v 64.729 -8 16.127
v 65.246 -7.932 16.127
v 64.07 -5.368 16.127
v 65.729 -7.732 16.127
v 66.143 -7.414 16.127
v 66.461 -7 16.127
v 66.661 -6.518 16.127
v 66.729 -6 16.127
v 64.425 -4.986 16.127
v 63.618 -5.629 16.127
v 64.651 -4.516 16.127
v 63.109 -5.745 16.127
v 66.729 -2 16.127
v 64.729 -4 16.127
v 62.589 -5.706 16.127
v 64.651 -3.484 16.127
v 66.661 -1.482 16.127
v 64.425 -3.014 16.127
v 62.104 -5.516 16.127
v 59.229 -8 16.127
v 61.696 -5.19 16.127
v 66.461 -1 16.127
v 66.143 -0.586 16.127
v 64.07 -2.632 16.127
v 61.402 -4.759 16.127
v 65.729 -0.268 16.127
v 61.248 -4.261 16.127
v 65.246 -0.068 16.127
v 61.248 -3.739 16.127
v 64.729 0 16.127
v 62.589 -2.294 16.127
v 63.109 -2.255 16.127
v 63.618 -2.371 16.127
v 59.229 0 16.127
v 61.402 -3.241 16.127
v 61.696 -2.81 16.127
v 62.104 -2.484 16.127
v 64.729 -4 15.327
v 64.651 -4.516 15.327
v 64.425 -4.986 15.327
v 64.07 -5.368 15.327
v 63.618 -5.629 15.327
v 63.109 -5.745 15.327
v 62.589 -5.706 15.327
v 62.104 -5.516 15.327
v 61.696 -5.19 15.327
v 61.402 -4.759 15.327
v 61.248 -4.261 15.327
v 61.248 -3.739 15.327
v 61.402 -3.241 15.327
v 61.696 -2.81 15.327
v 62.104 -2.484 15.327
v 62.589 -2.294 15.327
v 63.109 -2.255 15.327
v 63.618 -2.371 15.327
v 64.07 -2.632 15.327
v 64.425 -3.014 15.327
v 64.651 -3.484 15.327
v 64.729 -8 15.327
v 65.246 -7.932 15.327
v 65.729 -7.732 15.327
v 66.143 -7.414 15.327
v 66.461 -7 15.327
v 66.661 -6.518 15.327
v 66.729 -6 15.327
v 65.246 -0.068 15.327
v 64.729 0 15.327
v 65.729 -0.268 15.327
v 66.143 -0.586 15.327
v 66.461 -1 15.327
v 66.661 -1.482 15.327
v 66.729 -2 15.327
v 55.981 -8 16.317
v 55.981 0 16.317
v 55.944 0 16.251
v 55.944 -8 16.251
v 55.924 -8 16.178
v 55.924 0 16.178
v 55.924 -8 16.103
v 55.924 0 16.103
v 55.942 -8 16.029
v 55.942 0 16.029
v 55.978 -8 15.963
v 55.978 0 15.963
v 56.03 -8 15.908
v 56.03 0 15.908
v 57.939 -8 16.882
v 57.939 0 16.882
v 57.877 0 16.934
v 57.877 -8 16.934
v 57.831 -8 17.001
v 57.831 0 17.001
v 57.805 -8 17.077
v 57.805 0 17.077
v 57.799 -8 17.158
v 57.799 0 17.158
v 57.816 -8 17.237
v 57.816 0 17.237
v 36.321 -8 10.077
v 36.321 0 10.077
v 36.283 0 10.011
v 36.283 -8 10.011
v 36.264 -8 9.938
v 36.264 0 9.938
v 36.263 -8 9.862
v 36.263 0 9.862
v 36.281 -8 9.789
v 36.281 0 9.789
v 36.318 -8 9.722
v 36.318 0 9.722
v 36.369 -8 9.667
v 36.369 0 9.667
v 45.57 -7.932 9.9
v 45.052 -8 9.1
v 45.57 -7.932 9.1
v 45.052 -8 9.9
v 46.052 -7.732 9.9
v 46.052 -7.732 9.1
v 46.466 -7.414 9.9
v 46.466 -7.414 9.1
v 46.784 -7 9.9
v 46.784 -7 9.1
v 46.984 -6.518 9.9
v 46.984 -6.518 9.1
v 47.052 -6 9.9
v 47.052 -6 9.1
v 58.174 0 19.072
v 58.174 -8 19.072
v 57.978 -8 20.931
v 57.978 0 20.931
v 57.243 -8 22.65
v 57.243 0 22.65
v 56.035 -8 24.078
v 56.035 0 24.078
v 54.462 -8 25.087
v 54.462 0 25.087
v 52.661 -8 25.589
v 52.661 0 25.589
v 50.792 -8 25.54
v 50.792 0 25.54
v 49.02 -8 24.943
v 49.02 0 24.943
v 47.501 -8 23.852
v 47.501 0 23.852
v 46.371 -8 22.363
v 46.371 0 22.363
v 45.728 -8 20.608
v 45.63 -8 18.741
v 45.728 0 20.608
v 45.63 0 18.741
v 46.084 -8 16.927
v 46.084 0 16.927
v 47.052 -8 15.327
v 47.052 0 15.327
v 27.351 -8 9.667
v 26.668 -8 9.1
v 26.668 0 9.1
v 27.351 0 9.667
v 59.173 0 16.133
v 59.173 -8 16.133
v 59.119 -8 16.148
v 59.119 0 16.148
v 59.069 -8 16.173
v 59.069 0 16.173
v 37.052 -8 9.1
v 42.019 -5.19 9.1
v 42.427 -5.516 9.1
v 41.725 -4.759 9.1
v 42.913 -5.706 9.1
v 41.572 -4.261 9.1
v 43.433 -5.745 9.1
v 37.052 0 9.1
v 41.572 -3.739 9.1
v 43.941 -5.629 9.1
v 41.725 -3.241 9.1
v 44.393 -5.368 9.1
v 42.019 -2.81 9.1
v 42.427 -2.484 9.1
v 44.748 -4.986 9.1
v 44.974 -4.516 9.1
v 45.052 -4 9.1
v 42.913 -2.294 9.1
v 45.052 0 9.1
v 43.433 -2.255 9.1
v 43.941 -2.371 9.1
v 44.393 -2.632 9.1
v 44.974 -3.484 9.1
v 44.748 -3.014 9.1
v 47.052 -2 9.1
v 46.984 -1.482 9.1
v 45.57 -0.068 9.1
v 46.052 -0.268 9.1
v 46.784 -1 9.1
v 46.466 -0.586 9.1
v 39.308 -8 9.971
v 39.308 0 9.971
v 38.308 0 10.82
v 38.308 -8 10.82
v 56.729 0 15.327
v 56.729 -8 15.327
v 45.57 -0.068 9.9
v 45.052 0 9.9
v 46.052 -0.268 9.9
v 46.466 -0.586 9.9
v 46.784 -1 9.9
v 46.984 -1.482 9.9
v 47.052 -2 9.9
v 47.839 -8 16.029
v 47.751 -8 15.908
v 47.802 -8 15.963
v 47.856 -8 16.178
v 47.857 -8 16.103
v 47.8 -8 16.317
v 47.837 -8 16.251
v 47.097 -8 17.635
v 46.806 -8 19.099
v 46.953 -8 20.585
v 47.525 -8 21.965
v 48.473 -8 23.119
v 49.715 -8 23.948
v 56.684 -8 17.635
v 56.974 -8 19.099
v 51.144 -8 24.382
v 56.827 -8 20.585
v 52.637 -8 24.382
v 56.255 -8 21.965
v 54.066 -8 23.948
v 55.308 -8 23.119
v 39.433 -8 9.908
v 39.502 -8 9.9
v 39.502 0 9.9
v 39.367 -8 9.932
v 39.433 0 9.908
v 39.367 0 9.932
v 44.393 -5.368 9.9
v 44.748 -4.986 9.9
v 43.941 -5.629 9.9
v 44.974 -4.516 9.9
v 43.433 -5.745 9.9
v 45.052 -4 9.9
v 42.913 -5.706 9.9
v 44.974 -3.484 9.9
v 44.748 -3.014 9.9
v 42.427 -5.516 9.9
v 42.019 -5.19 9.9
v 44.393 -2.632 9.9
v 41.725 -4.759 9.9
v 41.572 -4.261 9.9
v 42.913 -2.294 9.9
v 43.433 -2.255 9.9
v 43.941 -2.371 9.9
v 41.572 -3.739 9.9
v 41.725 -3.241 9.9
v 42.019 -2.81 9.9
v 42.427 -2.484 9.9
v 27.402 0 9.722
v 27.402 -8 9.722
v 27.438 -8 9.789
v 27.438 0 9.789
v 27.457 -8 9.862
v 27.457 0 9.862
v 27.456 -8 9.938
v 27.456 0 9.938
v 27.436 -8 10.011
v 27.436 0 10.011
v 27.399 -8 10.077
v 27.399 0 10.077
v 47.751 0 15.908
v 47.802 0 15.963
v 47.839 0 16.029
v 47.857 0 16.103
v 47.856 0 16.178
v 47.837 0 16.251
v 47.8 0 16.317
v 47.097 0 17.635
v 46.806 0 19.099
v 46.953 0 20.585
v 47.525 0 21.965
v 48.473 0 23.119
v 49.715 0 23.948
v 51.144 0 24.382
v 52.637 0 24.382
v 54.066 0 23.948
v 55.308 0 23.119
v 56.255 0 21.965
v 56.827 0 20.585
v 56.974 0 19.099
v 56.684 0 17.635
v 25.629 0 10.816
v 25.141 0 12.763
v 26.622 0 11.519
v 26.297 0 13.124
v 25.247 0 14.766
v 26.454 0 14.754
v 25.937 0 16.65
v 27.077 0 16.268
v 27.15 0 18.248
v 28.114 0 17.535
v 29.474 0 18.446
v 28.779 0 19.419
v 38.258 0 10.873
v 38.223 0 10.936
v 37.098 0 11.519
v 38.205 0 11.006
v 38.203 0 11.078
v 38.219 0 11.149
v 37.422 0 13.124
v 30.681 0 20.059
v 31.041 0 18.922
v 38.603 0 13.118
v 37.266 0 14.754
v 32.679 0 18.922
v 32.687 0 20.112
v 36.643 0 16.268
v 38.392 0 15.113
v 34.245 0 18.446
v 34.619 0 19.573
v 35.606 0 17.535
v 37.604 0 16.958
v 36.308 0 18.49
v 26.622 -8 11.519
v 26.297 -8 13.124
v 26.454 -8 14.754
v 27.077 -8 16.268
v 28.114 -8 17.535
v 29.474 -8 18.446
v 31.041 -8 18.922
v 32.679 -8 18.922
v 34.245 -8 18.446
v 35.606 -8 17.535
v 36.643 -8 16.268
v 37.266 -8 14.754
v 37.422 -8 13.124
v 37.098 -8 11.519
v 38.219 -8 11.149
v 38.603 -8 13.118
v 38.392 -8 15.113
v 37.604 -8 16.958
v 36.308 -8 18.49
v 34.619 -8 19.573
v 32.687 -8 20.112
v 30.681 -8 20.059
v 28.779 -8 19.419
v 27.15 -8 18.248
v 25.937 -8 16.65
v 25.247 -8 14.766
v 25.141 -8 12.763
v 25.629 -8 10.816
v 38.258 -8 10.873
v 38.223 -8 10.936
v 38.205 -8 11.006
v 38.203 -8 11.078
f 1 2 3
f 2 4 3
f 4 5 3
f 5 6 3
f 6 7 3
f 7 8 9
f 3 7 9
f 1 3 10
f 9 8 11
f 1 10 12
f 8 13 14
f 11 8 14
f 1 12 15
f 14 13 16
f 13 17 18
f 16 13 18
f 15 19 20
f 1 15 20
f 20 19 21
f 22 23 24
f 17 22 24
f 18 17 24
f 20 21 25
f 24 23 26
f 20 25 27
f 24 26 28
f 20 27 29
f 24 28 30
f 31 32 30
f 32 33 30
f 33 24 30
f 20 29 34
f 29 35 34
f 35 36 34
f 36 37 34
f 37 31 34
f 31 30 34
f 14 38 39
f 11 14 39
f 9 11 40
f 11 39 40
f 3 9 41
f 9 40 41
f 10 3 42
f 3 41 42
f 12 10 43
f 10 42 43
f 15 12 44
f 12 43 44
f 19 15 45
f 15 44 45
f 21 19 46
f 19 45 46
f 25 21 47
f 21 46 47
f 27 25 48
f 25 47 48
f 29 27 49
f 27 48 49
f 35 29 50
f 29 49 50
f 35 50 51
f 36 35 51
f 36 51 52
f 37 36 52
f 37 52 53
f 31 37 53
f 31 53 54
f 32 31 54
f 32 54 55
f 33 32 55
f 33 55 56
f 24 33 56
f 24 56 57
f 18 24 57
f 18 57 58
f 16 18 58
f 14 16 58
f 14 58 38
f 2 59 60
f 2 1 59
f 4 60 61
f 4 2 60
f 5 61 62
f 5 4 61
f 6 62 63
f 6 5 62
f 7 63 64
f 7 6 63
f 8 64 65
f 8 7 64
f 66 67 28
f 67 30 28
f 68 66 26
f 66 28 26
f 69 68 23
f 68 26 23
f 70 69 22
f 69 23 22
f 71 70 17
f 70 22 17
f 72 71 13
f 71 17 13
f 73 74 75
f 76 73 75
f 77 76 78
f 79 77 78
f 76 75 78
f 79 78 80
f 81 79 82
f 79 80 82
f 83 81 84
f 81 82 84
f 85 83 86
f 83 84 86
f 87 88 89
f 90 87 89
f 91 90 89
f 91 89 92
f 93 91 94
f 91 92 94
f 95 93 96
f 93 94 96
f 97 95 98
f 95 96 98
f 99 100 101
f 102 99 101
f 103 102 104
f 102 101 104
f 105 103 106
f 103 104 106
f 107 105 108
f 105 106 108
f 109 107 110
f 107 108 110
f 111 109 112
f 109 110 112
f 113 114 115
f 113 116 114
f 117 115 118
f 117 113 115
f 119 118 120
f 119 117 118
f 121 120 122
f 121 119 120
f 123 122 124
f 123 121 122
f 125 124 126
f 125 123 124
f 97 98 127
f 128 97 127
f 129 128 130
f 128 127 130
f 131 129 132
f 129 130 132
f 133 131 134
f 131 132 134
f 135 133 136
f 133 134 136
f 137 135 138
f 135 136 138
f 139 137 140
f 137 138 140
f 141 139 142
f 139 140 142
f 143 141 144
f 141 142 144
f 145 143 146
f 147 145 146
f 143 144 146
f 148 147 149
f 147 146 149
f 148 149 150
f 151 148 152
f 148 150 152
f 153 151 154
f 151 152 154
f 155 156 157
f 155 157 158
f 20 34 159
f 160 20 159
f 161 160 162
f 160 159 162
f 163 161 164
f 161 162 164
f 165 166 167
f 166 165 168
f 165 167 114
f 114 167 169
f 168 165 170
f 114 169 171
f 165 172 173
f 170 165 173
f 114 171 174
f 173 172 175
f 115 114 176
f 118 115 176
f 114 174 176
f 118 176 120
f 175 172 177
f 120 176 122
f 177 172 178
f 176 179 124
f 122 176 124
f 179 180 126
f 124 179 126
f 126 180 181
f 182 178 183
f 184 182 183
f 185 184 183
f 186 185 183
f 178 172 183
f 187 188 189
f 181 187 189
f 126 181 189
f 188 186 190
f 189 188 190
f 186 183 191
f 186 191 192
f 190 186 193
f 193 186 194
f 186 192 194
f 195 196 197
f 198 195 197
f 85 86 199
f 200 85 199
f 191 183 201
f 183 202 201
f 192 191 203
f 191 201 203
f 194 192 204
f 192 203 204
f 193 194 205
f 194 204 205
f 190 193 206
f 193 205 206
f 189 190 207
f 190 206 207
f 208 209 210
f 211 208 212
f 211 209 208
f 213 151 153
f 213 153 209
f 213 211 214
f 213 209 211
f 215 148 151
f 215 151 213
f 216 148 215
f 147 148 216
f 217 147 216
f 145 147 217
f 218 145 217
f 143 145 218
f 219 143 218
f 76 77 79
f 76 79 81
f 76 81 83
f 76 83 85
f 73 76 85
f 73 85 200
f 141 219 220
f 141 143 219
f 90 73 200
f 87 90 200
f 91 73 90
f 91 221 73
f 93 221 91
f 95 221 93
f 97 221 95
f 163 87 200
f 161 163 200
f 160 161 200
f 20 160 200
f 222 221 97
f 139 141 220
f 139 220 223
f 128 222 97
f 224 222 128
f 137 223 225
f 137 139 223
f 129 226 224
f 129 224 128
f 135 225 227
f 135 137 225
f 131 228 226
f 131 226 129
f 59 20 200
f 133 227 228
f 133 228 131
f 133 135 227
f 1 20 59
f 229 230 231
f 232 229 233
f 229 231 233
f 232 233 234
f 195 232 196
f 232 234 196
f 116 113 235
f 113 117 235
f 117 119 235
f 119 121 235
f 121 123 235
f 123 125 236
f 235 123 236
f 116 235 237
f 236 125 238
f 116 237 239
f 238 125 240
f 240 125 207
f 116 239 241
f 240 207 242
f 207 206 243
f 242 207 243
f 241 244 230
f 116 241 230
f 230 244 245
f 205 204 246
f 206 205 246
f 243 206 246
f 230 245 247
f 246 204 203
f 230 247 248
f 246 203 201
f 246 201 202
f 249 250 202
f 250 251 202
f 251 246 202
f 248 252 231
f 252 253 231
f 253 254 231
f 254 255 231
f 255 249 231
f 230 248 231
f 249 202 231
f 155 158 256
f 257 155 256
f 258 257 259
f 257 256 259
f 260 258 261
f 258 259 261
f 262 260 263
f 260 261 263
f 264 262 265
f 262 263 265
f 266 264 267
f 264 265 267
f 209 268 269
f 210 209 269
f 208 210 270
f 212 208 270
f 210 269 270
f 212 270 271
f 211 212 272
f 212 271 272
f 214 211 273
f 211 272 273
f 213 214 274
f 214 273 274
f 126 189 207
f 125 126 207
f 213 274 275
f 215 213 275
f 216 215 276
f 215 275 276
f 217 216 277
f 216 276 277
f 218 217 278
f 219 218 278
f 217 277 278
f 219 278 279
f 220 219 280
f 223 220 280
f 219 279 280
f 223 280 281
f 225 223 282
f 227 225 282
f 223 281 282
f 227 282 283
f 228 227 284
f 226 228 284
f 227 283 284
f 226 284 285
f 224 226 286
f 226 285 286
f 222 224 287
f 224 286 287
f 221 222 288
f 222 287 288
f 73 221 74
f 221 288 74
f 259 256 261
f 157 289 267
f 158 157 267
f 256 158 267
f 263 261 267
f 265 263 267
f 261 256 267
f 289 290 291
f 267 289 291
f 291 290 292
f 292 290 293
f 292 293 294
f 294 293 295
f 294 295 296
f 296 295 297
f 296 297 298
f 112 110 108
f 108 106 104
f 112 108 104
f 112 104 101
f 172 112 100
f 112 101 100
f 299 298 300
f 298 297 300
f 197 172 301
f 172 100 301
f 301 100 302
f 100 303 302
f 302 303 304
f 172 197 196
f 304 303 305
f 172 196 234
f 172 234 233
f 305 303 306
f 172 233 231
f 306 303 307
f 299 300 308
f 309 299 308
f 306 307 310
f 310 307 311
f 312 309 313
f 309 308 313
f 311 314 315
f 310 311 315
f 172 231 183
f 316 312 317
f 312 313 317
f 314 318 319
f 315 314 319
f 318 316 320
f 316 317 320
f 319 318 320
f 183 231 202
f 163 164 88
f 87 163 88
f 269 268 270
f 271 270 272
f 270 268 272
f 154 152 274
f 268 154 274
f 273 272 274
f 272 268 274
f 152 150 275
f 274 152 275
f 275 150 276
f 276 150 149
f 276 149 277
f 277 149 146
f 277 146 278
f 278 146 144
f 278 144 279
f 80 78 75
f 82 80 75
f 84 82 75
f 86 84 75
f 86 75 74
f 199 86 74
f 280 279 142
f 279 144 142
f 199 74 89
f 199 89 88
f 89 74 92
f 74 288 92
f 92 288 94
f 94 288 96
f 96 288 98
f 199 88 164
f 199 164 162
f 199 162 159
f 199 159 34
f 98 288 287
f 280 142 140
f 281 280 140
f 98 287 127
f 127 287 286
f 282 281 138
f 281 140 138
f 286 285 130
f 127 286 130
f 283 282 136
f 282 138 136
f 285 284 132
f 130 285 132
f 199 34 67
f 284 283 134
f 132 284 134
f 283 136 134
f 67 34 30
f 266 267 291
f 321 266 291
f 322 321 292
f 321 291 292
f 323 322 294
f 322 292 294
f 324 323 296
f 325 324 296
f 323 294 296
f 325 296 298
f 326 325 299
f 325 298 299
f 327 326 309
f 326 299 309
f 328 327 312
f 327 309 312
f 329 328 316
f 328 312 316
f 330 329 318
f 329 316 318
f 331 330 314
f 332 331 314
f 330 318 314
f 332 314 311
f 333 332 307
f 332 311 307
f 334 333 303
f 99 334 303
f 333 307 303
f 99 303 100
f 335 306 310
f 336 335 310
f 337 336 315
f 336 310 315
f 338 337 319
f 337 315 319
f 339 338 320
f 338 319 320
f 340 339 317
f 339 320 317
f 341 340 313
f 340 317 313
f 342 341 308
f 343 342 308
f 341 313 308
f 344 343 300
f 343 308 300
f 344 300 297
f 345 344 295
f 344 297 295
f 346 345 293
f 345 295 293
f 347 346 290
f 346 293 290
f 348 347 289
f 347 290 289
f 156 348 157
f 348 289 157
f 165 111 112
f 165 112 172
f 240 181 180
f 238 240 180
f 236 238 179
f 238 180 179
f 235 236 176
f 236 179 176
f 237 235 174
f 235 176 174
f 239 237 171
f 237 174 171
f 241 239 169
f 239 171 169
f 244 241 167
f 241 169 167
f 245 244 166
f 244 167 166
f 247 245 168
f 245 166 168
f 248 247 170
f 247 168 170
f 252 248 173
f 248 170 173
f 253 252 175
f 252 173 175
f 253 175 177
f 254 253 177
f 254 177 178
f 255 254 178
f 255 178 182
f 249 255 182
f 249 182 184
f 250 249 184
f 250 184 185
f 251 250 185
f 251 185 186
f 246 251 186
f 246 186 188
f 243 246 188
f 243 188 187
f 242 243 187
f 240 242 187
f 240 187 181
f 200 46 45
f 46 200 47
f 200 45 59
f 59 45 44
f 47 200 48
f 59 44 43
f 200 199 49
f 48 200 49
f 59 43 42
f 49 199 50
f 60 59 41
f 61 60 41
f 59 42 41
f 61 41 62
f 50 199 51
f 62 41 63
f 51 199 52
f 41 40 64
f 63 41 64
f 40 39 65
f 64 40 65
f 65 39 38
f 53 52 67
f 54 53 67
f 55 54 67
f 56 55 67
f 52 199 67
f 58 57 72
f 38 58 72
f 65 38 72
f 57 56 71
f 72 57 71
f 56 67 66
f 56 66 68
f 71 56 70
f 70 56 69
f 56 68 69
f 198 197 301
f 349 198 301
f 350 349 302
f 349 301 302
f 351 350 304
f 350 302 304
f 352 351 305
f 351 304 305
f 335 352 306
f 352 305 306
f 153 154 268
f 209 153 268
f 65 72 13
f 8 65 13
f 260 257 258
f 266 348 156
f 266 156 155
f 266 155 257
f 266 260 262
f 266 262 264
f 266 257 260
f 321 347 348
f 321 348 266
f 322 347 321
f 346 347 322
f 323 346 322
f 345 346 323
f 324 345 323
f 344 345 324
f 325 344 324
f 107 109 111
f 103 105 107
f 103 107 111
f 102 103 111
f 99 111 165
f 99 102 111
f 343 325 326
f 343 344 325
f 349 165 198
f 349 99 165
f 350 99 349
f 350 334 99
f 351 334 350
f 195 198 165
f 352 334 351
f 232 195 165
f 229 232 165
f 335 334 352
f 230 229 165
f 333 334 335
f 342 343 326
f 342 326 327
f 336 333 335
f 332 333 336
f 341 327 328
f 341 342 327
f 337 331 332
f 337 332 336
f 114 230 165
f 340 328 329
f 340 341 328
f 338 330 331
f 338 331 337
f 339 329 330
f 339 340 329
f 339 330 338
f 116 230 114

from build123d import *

# Parameters (mm, degrees)
F1_DEPTH = 8
F4_DEPTH = 25
F5_R     = 2


with BuildPart() as f1:
    # F0 (on Front) → F1 (new body)
    with BuildSketch(Plane.XZ):
        with BuildLine():
            ThreePointArc((27.39914, 10.077377), (31.859929, 18.982982), (36.320718, 10.077377))
            ThreePointArc((36.320718, 10.077377), (36.263054, 9.862473), (36.369276, 9.666959))
            Line((36.369276, 9.666959), (37.052079, 9.099738))
            Line((37.052079, 9.099738), (47.052079, 9.099738))
            Line((47.052079, 9.099738), (47.052079, 9.899738))
            Line((47.052079, 9.899738), (39.502488, 9.899738))
            ThreePointArc((39.502488, 9.899738), (39.399167, 9.918092), (39.308488, 9.970907))
            Line((39.308488, 9.970907), (38.307535, 10.819503))
            ThreePointArc((38.307535, 10.819503), (38.211834, 10.970406), (38.218914, 11.148958))
            ThreePointArc((38.218914, 11.148958), (30.680861, 20.059207), (26.667779, 9.099738))
            Line((26.667779, 9.099738), (27.350582, 9.666959))
            ThreePointArc((27.350582, 9.666959), (27.456804, 9.862473), (27.39914, 10.077377))
        make_face()
        with BuildLine():
            ThreePointArc((47.800167, 16.317188), (51.890394, 24.436733), (55.980621, 16.317188))
            ThreePointArc((55.980621, 16.317188), (55.923854, 16.102702), (56.029995, 15.907867))
            Line((56.029995, 15.907867), (56.728709, 15.327428))
            Line((56.728709, 15.327428), (66.728709, 15.327428))
            Line((66.728709, 15.327428), (66.728709, 16.127428))
            Line((66.728709, 16.127428), (59.228709, 16.127428))
            ThreePointArc((59.228709, 16.127428), (59.14576, 16.139124), (59.069279, 16.173298))
            Line((59.069279, 16.173298), (57.939218, 16.882244))
            ThreePointArc((57.939218, 16.882244), (57.815249, 17.037961), (57.816026, 17.236998))
            ThreePointArc((57.816026, 17.236998), (50.791677, 25.54003), (47.052079, 15.327428))
            Line((47.052079, 15.327428), (47.750793, 15.907867))
            ThreePointArc((47.750793, 15.907867), (47.856934, 16.102702), (47.800167, 16.317188))
        make_face()
    extrude(amount=F1_DEPTH)

    # F2 (on face) + F3 (on face) → F4 (cut)
    with BuildSketch(Plane(origin=(0, 0, 9.099738), x_dir=(1, 0, 0), z_dir=(0, 0, -1))):
        with BuildLine():
            ThreePointArc((41.552079, 4), (43.302079, 2.25), (45.052079, 4))
            Line((45.052079, 4), (41.552079, 4))
        make_face()
        with BuildLine():
            Line((41.552079, 4), (45.052079, 4))
            ThreePointArc((45.052079, 4), (43.302079, 5.75), (41.552079, 4))
        make_face()
    with BuildSketch(Plane(origin=(0, 0, 15.327428), x_dir=(1, 0, 0), z_dir=(0, 0, -1))):
        with BuildLine():
            ThreePointArc((61.228709, 4), (62.978709, 2.25), (64.728709, 4))
            Line((64.728709, 4), (61.228709, 4))
        make_face()
        with BuildLine():
            Line((61.228709, 4), (64.728709, 4))
            ThreePointArc((64.728709, 4), (62.978709, 5.75), (61.228709, 4))
        make_face()
    extrude(amount=-F4_DEPTH, mode=Mode.SUBTRACT)

    # F5
    f5_edges = [f1.edges().sort_by_distance(p)[0] for p in [
        (47.052079, -8, 9.499738),
        (47.052079, 0, 9.499738),
        (66.728709, -8, 15.727428),
        (66.728709, 0, 15.727428),
    ]]
    fillet(f5_edges, radius=F5_R)


solid = f1.part
